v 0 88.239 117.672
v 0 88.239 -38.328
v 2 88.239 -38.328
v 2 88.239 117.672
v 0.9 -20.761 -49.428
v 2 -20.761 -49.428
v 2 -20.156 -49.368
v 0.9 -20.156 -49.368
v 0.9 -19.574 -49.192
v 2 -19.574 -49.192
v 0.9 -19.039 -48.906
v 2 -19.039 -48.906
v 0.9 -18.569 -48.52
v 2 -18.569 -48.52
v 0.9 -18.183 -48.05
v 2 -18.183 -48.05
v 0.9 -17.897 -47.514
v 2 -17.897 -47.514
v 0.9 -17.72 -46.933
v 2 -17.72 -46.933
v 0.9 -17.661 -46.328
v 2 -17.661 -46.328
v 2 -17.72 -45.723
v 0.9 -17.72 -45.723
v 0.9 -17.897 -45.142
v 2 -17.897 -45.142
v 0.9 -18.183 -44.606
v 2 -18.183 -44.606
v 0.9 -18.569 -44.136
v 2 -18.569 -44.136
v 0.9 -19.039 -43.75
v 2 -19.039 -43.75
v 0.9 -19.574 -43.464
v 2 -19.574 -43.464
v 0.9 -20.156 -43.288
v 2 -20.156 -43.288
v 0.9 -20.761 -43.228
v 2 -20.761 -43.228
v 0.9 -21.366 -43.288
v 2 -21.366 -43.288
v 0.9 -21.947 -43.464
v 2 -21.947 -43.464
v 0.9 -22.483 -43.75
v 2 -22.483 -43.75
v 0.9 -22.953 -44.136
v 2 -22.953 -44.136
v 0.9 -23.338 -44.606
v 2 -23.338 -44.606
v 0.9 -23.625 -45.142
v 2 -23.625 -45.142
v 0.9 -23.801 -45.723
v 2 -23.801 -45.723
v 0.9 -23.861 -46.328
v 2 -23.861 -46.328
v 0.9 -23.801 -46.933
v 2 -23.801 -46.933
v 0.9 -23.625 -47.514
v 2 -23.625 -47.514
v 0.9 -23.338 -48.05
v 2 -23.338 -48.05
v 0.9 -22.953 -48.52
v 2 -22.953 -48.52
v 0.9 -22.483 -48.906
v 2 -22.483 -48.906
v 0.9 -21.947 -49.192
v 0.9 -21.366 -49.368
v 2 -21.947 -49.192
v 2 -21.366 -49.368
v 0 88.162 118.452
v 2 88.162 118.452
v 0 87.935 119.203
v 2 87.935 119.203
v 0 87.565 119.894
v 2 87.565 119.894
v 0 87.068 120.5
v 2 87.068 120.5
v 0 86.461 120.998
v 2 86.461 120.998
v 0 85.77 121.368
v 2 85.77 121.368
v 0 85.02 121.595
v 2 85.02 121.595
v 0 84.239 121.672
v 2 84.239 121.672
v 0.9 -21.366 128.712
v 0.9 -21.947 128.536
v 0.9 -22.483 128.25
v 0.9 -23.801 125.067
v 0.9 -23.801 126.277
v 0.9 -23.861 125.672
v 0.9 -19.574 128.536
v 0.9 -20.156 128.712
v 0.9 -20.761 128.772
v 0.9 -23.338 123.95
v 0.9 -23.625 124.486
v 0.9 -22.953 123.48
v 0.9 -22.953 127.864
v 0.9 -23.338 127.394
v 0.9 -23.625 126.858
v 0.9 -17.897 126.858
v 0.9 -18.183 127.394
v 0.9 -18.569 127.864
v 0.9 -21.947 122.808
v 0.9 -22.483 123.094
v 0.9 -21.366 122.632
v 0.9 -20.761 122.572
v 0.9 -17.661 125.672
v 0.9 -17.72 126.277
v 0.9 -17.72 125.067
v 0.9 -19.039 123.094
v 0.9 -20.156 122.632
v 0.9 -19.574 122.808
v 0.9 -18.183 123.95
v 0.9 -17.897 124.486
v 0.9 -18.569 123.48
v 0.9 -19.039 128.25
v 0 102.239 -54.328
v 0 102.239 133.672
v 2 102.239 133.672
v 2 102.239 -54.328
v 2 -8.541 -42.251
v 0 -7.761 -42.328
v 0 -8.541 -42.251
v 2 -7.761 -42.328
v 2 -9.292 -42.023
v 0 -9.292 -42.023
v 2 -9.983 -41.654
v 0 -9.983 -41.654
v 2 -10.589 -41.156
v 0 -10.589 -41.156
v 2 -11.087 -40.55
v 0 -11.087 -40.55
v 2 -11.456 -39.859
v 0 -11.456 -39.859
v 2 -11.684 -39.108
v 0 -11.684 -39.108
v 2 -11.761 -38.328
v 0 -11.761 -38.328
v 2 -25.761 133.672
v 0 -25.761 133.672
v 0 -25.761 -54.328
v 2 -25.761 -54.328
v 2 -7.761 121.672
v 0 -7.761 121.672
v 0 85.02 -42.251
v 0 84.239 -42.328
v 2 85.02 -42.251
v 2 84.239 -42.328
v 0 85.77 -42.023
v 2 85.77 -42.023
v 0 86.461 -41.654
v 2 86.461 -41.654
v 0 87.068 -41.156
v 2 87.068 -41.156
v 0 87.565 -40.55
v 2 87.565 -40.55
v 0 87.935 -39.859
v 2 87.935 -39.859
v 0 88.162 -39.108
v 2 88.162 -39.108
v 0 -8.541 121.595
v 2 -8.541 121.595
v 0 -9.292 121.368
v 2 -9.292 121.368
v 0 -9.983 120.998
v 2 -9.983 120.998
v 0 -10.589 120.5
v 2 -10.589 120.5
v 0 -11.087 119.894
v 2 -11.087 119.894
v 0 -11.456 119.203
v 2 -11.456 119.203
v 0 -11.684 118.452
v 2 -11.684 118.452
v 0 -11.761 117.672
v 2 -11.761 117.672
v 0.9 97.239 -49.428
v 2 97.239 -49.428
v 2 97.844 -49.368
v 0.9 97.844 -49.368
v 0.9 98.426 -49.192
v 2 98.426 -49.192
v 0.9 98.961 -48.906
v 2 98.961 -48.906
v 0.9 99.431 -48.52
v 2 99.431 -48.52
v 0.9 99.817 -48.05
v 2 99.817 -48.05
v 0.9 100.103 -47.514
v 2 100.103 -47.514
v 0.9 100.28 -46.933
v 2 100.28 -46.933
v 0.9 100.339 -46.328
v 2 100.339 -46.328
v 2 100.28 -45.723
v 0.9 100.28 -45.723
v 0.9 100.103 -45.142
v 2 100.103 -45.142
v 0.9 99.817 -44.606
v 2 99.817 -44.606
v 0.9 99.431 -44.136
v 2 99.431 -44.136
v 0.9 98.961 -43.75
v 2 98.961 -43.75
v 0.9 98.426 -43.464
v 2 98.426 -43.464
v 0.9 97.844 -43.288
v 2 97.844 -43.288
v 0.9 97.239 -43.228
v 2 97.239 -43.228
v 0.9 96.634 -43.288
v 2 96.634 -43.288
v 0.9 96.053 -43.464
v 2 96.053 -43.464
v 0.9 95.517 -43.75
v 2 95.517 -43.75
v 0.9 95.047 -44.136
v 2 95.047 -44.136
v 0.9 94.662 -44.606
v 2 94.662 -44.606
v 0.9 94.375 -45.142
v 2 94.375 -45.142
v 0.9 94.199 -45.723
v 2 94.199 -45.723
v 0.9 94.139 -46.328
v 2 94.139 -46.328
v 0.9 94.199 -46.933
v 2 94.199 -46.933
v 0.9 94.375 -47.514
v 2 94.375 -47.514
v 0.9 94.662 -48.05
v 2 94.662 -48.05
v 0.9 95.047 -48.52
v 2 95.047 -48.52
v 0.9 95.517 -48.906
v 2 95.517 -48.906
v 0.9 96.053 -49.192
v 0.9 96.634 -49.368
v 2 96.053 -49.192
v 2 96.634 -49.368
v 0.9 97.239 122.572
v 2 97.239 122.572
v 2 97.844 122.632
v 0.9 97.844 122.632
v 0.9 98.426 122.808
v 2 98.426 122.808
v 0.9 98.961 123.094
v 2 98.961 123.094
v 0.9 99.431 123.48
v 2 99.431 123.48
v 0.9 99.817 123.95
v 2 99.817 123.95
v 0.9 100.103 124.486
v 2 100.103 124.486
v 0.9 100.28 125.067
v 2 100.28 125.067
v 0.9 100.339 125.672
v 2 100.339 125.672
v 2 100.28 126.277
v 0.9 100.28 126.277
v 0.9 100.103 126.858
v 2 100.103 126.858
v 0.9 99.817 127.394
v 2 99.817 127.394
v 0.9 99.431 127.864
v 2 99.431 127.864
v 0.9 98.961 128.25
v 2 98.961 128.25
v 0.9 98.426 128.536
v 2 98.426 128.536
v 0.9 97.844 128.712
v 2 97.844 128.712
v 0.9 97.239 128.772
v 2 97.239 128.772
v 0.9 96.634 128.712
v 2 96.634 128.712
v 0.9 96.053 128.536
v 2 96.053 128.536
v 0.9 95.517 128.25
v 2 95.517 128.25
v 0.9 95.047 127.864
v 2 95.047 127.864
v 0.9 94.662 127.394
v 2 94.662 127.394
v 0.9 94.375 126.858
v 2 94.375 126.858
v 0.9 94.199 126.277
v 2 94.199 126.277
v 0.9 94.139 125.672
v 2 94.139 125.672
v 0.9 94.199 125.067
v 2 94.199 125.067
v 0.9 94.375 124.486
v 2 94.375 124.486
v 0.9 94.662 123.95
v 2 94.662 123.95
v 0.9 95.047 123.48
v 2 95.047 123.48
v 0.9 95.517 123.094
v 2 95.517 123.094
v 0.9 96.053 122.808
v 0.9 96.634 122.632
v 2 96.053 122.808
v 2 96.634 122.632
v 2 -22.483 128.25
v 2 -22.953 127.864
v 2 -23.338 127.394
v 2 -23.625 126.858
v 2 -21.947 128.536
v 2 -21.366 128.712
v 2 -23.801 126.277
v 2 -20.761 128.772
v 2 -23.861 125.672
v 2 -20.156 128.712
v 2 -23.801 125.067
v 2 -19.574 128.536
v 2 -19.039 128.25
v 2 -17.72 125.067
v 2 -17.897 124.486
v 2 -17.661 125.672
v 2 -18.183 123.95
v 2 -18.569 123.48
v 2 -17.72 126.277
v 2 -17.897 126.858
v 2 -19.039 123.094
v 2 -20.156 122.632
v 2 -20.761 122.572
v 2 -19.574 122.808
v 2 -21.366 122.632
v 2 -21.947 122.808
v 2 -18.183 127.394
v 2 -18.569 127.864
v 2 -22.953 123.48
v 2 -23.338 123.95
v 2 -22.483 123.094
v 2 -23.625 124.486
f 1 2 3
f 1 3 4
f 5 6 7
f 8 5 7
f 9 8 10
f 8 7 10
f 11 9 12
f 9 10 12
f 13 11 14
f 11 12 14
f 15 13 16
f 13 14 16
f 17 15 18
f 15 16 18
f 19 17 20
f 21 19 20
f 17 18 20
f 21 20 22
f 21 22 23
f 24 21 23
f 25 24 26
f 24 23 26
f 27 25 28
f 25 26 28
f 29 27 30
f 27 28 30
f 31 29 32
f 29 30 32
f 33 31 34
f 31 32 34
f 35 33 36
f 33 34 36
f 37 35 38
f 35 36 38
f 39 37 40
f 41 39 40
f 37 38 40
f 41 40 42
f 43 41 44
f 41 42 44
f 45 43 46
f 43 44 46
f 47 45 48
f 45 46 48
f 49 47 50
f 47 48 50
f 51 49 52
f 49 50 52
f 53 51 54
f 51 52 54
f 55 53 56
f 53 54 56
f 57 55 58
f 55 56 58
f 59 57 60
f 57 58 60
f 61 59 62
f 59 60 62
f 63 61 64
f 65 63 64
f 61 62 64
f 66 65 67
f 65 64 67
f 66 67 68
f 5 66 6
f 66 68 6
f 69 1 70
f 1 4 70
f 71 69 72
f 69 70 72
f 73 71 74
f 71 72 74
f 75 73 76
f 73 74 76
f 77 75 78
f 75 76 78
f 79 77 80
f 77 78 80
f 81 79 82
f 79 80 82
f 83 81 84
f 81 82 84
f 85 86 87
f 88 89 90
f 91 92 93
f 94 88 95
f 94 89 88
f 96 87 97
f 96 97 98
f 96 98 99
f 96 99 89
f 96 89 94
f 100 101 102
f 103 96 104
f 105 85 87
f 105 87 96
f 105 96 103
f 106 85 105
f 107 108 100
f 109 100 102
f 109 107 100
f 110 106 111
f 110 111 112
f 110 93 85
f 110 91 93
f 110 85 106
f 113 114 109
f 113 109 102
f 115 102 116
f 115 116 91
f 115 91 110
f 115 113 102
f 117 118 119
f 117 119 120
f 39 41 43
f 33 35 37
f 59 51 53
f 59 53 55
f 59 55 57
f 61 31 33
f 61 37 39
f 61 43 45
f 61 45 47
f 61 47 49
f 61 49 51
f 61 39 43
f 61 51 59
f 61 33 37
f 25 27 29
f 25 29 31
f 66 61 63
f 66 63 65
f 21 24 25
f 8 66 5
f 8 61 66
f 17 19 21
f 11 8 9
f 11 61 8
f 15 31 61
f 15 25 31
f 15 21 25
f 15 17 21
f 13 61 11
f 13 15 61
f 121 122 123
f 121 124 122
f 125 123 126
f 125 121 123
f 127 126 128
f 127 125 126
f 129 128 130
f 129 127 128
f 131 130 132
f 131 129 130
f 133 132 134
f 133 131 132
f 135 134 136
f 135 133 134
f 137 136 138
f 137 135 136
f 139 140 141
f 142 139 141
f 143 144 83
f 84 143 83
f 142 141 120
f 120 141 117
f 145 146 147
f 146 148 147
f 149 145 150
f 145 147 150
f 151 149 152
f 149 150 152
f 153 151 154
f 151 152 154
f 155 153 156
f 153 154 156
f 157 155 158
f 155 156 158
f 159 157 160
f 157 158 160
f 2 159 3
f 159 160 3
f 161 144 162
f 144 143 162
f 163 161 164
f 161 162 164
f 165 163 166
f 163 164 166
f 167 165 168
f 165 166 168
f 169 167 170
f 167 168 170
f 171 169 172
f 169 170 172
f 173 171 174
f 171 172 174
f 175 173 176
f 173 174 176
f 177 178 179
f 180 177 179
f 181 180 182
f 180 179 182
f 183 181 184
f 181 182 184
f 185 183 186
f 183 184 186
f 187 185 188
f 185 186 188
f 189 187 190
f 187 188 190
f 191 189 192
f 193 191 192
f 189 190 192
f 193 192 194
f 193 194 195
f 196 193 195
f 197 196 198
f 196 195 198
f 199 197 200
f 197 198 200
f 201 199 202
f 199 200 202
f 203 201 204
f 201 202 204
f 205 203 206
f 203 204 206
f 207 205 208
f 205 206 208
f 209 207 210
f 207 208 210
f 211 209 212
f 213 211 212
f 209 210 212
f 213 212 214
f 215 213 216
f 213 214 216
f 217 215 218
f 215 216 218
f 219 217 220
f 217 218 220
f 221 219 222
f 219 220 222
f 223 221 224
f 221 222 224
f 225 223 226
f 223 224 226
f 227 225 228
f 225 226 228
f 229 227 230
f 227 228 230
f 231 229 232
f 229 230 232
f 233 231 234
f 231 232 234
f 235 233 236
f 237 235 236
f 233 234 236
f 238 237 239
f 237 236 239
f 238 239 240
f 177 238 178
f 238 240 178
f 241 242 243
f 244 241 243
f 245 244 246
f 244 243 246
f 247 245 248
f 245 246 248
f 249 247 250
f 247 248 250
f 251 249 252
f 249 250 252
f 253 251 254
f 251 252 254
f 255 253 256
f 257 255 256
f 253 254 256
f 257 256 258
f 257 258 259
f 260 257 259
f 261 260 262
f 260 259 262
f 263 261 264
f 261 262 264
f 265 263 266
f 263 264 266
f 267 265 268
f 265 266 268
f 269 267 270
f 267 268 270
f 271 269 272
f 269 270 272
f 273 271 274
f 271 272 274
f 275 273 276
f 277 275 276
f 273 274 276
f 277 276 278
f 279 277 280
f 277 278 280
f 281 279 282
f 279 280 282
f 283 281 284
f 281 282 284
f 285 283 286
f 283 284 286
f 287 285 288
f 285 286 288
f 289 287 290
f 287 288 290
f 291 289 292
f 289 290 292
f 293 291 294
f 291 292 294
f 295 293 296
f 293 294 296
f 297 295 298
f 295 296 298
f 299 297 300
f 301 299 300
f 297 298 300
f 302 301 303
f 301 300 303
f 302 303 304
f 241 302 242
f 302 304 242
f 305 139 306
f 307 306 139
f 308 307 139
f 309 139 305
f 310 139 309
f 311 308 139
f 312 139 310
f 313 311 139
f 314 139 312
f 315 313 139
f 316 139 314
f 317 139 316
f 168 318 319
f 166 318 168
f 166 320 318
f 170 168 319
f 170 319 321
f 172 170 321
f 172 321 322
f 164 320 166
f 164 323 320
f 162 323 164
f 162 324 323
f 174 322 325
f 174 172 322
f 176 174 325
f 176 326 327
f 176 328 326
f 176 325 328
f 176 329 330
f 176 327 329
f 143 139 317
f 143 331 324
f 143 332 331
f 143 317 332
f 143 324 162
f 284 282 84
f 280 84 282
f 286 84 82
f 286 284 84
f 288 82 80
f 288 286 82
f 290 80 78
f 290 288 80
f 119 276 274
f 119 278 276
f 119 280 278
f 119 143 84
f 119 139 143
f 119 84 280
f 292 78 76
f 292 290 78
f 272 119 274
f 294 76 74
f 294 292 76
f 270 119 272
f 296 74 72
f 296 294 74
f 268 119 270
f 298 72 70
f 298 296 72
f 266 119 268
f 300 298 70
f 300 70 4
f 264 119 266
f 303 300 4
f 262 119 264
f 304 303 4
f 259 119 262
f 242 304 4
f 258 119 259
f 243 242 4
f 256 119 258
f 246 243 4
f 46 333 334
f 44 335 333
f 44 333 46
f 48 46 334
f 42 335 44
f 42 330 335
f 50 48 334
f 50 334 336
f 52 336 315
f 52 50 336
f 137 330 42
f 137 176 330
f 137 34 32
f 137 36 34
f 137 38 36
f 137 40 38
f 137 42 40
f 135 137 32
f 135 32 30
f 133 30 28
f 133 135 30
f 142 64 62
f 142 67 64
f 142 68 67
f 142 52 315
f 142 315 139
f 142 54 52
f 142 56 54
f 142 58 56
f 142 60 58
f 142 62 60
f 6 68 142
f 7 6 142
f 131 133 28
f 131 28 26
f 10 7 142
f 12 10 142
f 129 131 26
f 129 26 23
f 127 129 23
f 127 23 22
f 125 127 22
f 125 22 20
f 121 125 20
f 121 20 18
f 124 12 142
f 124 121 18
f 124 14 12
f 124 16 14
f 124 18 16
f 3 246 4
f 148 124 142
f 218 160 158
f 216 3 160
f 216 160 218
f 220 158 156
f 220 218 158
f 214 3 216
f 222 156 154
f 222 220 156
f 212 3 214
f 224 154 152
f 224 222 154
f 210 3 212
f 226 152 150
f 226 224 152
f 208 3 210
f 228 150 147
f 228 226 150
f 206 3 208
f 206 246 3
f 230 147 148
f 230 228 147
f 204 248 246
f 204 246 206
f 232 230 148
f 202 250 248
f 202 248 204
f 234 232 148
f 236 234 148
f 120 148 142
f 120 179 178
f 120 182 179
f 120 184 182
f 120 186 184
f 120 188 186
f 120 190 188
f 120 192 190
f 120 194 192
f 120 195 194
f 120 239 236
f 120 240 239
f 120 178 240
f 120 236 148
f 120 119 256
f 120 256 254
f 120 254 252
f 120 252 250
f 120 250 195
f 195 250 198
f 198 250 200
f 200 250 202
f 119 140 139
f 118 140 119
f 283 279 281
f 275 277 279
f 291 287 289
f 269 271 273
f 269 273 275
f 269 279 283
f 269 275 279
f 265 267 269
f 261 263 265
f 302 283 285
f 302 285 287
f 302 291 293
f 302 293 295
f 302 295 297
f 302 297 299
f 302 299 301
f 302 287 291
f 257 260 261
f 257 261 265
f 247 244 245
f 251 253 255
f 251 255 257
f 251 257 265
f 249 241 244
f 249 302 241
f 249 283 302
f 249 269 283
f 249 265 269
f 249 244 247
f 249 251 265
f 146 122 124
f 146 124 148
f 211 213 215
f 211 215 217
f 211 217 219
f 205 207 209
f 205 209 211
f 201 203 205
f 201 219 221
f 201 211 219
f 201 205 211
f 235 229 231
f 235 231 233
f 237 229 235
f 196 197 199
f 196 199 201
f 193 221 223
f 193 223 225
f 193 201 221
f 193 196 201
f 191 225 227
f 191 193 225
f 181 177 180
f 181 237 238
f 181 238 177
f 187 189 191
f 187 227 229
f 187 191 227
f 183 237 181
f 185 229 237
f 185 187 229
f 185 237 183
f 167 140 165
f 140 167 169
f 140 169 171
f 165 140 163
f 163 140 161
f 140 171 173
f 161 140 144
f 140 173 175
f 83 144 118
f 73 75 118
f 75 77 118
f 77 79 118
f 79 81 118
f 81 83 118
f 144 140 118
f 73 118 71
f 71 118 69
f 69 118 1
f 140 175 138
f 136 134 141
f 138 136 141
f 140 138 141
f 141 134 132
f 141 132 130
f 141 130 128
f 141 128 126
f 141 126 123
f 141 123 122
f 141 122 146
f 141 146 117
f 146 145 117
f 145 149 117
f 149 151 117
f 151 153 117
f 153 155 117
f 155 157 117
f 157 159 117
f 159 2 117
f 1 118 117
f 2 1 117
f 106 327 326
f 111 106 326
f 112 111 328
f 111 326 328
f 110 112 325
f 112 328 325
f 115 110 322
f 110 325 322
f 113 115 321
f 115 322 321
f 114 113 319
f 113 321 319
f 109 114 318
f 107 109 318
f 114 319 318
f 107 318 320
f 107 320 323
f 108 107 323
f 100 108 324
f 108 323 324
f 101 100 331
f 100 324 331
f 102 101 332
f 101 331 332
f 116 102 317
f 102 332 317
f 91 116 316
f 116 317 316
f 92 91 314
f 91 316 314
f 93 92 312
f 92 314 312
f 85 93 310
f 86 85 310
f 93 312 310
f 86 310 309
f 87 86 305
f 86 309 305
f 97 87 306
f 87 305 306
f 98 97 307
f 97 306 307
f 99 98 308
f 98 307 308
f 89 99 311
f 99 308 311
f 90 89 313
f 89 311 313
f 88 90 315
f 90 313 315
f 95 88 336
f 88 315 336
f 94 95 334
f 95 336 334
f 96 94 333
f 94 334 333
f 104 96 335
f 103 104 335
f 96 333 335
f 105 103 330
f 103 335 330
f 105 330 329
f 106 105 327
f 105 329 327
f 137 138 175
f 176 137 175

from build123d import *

# Parameters (mm, degrees)
SKETCH_1_W          = 188
SKETCH_1_H          = 128
EXTRUDE_1_DEPTH     = 2
SKETCH_8_R          = 3.1
CUT_EXTRUDE_5_DEPTH = 1.1
SKETCH_11_W         = 164
SKETCH_11_H         = 100
CUT_EXTRUDE_8_DEPTH = 10
FILLET_2_R          = 4


with BuildPart() as part:
    # 草图1 → 凸台-拉伸1 (new body)
    with BuildSketch(Plane(origin=(0, 0, 0), x_dir=(0, 0, -1), z_dir=(1, 0, 0))):
        with Locations((-39.672025676, 38.239203457)):
            Rectangle(SKETCH_1_W, SKETCH_1_H)
    extrude(amount=EXTRUDE_1_DEPTH)

    # 草图8 → 切除-拉伸5 (cut)
    with BuildSketch(Plane(origin=(2, 0, 0), x_dir=(0, 0, -1), z_dir=(1, 0, 0))):
        with Locations((-125.672025676, 97.239203457)):
            Circle(SKETCH_8_R)
        with Locations((46.327974324, 97.239203457)):
            Circle(SKETCH_8_R)
        with Locations((-125.672025676, -20.760796543)):
            Circle(SKETCH_8_R)
        with Locations((46.327974324, -20.760796543)):
            Circle(SKETCH_8_R)
    extrude(amount=-CUT_EXTRUDE_5_DEPTH, mode=Mode.SUBTRACT)

    # 草图11 → 切除-拉伸8 (cut)
    with BuildSketch(Plane.ZY):
        with Locations((39.672025676, 38.239203457)):
            Rectangle(SKETCH_11_W, SKETCH_11_H)
    extrude(amount=-CUT_EXTRUDE_8_DEPTH, mode=Mode.SUBTRACT)

    # 圆角2
    fillet_2_edges = [part.edges().sort_by_distance(p)[0] for p in [
        (1, 88.239203457, 121.672025676),
        (1, -11.760796543, 121.672025676),
        (1, -11.760796543, -42.327974324),
        (1, 88.239203457, -42.327974324),
    ]]
    fillet(fillet_2_edges, radius=FILLET_2_R)


solid = part.part
